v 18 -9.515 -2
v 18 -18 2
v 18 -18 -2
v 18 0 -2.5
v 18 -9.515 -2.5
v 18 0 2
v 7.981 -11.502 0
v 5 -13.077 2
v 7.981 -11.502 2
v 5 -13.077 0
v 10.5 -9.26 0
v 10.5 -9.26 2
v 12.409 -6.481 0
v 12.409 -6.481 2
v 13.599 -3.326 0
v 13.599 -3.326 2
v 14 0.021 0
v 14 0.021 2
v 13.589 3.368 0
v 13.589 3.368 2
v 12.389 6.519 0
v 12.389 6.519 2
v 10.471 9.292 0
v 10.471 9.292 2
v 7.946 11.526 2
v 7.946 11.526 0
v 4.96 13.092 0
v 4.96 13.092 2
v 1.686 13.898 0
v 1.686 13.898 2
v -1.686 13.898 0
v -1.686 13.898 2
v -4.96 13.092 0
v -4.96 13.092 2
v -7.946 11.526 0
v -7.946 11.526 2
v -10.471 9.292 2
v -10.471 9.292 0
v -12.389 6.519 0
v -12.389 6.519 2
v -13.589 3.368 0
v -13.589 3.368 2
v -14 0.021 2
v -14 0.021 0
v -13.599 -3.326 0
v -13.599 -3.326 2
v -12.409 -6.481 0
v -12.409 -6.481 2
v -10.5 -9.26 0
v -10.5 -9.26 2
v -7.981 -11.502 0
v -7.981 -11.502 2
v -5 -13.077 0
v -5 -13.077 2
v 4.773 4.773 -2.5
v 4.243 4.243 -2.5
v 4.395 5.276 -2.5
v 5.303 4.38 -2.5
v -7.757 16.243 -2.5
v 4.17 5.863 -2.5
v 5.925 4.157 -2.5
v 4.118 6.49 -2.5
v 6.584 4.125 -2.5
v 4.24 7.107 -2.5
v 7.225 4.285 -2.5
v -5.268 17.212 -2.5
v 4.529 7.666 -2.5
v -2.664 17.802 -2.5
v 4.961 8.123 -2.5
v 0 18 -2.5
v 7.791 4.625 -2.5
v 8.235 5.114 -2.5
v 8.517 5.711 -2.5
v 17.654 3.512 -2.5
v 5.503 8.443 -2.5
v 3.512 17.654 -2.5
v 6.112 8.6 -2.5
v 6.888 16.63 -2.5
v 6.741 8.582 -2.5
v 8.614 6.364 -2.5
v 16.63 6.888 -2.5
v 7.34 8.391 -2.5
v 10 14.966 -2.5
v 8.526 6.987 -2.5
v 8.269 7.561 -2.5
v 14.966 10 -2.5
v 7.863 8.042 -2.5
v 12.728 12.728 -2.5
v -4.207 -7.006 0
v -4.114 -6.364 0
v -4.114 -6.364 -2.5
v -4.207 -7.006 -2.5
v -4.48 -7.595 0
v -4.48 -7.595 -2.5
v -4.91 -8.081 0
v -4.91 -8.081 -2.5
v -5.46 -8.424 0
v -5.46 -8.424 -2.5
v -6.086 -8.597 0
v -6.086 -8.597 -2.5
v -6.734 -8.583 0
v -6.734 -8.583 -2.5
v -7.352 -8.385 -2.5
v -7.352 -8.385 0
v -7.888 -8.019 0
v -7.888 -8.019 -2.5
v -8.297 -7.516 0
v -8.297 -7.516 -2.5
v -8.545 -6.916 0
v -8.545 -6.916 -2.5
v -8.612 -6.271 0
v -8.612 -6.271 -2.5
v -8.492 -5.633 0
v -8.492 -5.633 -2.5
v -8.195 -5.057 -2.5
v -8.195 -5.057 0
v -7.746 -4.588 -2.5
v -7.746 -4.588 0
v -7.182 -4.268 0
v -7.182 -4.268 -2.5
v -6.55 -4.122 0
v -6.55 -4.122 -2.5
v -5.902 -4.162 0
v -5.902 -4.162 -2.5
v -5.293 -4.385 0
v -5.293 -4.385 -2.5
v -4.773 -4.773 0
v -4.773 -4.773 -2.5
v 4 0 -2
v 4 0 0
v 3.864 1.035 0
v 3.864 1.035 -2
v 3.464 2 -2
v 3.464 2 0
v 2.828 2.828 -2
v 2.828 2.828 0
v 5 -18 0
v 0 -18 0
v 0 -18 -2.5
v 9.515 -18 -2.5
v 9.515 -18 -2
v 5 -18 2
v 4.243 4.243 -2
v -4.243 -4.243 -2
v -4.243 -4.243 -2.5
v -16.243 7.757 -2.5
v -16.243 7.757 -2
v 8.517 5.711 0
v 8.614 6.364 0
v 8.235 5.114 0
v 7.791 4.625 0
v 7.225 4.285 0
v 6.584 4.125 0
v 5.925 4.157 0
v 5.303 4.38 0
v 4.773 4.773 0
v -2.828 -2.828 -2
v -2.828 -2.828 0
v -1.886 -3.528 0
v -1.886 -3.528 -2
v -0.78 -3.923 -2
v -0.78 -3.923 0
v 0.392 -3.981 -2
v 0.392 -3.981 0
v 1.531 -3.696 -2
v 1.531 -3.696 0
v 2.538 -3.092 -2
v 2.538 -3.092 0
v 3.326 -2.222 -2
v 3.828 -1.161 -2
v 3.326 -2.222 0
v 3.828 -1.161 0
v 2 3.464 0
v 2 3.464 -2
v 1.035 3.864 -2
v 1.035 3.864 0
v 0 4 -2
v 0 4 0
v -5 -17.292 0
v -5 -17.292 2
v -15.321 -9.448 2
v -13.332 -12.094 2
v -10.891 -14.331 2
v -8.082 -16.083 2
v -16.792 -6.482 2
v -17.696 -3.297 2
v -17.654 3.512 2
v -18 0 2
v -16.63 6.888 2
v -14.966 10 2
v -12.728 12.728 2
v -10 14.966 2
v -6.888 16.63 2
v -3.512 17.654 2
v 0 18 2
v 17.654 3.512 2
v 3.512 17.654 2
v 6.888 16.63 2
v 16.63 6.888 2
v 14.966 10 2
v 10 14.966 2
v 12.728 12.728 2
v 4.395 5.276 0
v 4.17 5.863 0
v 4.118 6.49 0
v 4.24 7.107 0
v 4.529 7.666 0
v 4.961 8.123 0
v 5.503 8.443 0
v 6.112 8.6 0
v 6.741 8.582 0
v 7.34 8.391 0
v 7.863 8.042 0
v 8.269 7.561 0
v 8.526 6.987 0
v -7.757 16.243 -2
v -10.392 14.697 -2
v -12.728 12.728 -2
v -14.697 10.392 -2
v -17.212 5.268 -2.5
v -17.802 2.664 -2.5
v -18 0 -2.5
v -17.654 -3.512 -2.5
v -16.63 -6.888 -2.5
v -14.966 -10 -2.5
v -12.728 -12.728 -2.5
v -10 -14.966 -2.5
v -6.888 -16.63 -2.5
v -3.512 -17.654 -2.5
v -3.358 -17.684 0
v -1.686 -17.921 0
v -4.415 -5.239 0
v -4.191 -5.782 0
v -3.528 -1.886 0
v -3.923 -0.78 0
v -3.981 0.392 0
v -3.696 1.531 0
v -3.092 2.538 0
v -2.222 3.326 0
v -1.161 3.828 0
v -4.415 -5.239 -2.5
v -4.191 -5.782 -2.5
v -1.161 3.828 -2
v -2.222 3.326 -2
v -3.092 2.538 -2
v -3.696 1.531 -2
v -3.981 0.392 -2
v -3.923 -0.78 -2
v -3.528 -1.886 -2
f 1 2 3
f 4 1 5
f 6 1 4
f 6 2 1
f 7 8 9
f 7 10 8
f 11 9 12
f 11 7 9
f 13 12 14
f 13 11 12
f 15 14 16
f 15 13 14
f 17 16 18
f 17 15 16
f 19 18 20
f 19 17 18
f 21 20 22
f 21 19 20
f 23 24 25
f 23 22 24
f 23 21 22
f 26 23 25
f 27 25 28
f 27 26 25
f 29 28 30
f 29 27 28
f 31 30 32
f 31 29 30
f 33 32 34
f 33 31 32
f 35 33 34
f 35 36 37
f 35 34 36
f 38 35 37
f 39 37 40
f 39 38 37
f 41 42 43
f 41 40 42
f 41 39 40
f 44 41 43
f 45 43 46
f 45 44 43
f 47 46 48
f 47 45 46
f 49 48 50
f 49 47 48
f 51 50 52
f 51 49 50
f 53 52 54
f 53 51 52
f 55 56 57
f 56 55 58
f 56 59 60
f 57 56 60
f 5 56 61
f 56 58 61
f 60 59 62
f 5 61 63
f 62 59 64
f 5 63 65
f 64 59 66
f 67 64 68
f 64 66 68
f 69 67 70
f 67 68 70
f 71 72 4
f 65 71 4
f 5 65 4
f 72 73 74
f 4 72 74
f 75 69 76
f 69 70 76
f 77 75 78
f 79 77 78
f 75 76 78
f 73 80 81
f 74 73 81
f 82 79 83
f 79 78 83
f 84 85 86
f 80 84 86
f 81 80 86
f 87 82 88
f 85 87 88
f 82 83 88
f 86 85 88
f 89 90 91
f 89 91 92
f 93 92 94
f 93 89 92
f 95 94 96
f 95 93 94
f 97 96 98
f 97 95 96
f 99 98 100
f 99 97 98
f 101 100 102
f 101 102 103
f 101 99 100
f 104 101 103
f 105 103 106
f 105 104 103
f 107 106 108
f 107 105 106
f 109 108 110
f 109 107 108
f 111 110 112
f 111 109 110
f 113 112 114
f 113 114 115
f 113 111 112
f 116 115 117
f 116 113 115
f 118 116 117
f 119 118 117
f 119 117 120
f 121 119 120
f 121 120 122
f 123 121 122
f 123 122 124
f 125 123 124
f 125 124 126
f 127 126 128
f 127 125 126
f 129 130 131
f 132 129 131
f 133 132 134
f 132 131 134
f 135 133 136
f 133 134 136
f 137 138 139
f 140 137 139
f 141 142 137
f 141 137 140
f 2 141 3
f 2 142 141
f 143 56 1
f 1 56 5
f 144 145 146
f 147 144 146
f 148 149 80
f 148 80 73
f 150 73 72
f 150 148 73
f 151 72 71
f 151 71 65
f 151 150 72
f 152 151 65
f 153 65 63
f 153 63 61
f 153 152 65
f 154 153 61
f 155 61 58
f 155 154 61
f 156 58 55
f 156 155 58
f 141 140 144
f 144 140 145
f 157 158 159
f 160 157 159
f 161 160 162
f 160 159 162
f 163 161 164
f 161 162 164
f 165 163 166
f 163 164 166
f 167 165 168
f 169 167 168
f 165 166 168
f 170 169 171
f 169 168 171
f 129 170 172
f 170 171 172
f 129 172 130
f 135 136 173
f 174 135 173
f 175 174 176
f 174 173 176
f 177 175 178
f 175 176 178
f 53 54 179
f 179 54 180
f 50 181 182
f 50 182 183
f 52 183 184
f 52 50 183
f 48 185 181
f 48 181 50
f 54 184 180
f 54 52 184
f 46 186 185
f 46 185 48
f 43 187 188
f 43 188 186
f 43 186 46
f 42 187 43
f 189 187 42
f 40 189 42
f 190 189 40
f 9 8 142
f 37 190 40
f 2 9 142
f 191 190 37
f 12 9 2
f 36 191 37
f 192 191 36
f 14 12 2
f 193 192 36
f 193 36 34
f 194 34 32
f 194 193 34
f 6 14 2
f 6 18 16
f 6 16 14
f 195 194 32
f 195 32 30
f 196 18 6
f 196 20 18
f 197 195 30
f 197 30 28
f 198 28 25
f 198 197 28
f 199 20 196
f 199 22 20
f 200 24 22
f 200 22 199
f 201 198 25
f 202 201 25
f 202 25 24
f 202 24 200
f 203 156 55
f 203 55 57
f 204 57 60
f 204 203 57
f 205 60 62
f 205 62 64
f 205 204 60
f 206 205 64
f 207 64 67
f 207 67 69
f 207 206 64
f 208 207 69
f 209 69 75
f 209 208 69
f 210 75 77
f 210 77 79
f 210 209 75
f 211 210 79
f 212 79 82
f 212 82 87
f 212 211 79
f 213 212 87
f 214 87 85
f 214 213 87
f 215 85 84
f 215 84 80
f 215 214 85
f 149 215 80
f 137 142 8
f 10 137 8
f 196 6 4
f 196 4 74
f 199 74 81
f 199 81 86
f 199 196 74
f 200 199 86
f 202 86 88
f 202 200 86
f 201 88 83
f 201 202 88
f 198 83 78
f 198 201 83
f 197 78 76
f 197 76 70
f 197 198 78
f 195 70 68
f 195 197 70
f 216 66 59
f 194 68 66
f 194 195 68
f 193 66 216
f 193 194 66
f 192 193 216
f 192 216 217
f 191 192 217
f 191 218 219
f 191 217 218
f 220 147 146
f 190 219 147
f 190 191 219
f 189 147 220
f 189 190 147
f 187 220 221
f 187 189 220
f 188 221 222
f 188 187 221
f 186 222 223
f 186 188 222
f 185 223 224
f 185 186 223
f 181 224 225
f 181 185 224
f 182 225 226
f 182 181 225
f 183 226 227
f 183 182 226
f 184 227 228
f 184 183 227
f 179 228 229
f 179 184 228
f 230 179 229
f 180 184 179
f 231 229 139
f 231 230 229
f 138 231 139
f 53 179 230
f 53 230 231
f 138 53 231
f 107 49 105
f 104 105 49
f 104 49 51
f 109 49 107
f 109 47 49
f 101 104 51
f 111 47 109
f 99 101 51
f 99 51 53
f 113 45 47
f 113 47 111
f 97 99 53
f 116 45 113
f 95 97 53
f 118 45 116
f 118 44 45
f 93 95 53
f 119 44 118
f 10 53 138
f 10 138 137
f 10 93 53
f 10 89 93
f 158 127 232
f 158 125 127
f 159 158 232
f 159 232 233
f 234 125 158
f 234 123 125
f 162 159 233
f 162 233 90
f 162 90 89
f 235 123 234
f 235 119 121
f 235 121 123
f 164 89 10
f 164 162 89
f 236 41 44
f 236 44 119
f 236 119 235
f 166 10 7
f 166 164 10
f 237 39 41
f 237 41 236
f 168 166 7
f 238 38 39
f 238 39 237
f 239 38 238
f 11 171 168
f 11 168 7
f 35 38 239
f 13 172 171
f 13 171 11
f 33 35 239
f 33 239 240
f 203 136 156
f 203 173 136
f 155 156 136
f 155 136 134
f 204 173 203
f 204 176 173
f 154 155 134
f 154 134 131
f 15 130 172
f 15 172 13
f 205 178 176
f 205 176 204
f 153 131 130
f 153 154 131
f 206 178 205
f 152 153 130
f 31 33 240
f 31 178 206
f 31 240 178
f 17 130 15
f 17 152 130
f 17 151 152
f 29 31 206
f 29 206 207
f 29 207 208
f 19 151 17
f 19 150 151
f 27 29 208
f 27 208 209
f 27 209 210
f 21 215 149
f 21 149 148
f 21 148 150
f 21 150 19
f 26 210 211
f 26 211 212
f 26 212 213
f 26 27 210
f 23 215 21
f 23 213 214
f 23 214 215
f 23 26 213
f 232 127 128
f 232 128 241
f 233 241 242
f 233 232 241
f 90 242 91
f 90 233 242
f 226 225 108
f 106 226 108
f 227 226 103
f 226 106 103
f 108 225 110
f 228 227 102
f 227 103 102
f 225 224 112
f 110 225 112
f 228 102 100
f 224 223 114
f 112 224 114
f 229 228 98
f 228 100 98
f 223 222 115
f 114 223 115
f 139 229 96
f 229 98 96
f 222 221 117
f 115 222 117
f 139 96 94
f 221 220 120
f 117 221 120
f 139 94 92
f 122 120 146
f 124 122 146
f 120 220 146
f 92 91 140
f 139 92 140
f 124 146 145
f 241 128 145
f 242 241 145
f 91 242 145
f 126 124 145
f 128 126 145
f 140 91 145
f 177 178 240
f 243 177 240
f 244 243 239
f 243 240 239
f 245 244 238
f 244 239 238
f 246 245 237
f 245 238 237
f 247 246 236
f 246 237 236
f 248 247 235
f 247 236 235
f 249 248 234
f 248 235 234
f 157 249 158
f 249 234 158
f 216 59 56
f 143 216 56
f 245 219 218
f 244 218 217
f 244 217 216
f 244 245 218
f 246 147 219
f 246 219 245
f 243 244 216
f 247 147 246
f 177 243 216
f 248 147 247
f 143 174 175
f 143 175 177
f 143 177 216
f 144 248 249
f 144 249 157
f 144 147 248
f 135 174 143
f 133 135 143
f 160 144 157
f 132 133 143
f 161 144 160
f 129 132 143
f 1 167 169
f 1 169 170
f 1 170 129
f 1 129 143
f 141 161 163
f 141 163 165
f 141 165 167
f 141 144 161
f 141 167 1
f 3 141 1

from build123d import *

# Parameters (mm, degrees)
F0_R     = 14
F1_DEPTH = 2
F2_DEPTH = 2.5
F3_DEPTH = 3
F5_DEPTH = 0.5
F7_DEPTH = 2


# Not quite as in the source:
# - a feature names something its author has since deleted; it is built from what else it names


with BuildPart() as f1:
    # F0 (on Top) → F1 (new body)
    with BuildSketch(Plane.XY):
        with BuildLine():
            Line((18, -18), (18, 0))
            ThreePointArc((18, 0), (12.7279220614, 12.7279220614), (0, 18))
            ThreePointArc((0, 18), (-12.7279220614, 12.7279220614), (-18, 0))
            ThreePointArc((-18, 0), (-12.7279220614, -12.7279220614), (0, -18))
            Line((0, -18), (18, -18))
        make_face()
        Circle(F0_R, mode=Mode.SUBTRACT)
    extrude(amount=F1_DEPTH)

    # F0 (on Top) → F2 (join)
    with BuildSketch(Plane.XY):
        with BuildLine():
            Line((18, -18), (18, 0))
            ThreePointArc((18, 0), (12.7279220614, 12.7279220614), (0, 18))
            ThreePointArc((0, 18), (-12.7279220614, 12.7279220614), (-18, 0))
            ThreePointArc((-18, 0), (-12.7279220614, -12.7279220614), (0, -18))
            Line((0, -18), (18, -18))
        make_face()
        Circle(F0_R, mode=Mode.SUBTRACT)
        Circle(F0_R)
        with BuildLine():
            ThreePointArc((-4.1139610307, -6.3639610307), (-8.4426899788, -7.2249987535), (-4.772970773, -4.772970773))
            ThreePointArc((-4.772970773, -4.772970773), (-4.2852320825, -5.5029233079), (-4.1139610307, -6.3639610307))
        make_face(mode=Mode.SUBTRACT)
        with BuildLine():
            ThreePointArc((2.8284271247, 2.8284271247), (3.69551813, 1.5307337295), (4, 0))
            ThreePointArc((4, 0), (1.5307337295, -3.69551813), (-2.8284271247, -2.8284271247))
            ThreePointArc((-2.8284271247, -2.8284271247), (-3.69551813, 1.5307337295), (0, 4))
            ThreePointArc((0, 4), (1.5307337295, 3.69551813), (2.8284271247, 2.8284271247))
        make_face(mode=Mode.SUBTRACT)
        with BuildLine():
            ThreePointArc((8.6139610307, 6.3639610307), (7.2249987535, 4.2852320825), (4.772970773, 4.772970773))
            ThreePointArc((4.772970773, 4.772970773), (5.5029233079, 8.4426899788), (8.6139610307, 6.3639610307))
        make_face(mode=Mode.SUBTRACT)
        with BuildLine():
            ThreePointArc((-2.8284271247, -2.8284271247), (1.5307337295, -3.69551813), (4, 0))
            Line((4, 0), (0, 0))
            Line((0, 0), (-2.8284271247, -2.8284271247))
        make_face()
        with BuildLine():
            Line((0, 0), (2.8284271247, 2.8284271247))
            ThreePointArc((2.8284271247, 2.8284271247), (1.5307337295, 3.69551813), (0, 4))
            Line((0, 4), (0, 0))
        make_face()
        with BuildLine():
            ThreePointArc((0, 4), (-3.69551813, 1.5307337295), (-2.8284271247, -2.8284271247))
            Line((-2.8284271247, -2.8284271247), (0, 0))
            Line((0, 0), (0, 4))
        make_face()
        with BuildLine():
            Line((0, 0), (4, 0))
            ThreePointArc((4, 0), (3.69551813, 1.5307337295), (2.8284271247, 2.8284271247))
            Line((2.8284271247, 2.8284271247), (0, 0))
        make_face()
    extrude(amount=-F2_DEPTH)

    # F0 (on Top) → F3 (cut)
    with BuildSketch(Plane.XY):
        with BuildLine():
            ThreePointArc((-2.8284271247, -2.8284271247), (1.5307337295, -3.69551813), (4, 0))
            Line((4, 0), (0, 0))
            Line((0, 0), (-2.8284271247, -2.8284271247))
        make_face()
        with BuildLine():
            Line((0, 0), (4, 0))
            ThreePointArc((4, 0), (3.69551813, 1.5307337295), (2.8284271247, 2.8284271247))
            Line((2.8284271247, 2.8284271247), (0, 0))
        make_face()
        with BuildLine():
            Line((0, 0), (2.8284271247, 2.8284271247))
            ThreePointArc((2.8284271247, 2.8284271247), (1.5307337295, 3.69551813), (0, 4))
            Line((0, 4), (0, 0))
        make_face()
        with BuildLine():
            ThreePointArc((0, 4), (-3.69551813, 1.5307337295), (-2.8284271247, -2.8284271247))
            Line((-2.8284271247, -2.8284271247), (0, 0))
            Line((0, 0), (0, 4))
        make_face()
    extrude(amount=-F3_DEPTH, mode=Mode.SUBTRACT)

    # F4 (on face) → F5 (cut)
    with BuildSketch(Plane(origin=(0, 0, -2.5), x_dir=(1, 0, 0), z_dir=(0, 0, -1))):
        Polygon((4.2426406871, -4.2426406871), (0, 0), (-4.2426406871, 4.2426406871), (-16.9705627485, -8.4852813742), (-8.4852813742, -16.9705627485), align=None)
        Polygon((8.4852813742, 0), (0, 0), (4.2426406871, -4.2426406871), align=None)
        with BuildLine():
            Line((-2.8284271247, 2.8284271247), (0, 0))
            Line((0, 0), (4, 0))
            ThreePointArc((4, 0), (1.5307337295, 3.69551813), (-2.8284271247, 2.8284271247))
        make_face()
        with BuildLine():
            Line((-4.2426406871, 4.2426406871), (-2.8284271247, 2.8284271247))
            ThreePointArc((-2.8284271247, 2.8284271247), (1.5307337295, 3.69551813), (4, 0))
            Line((4, 0), (8.4852813742, 0))
            Line((8.4852813742, 0), (18, 9.5147186258))
            Line((18, 9.5147186258), (18, 18))
            Line((18, 18), (9.5147186258, 18))
            Line((9.5147186258, 18), (-4.2426406871, 4.2426406871))
        make_face()
    extrude(amount=-F5_DEPTH, mode=Mode.SUBTRACT)

    # F6 (on face) → F7 (cut)
    with BuildSketch(Plane.XY.offset(2)):
        with BuildLine():
            Line((5, -9), (0, -9))
            Line((0, -9), (0, -14))
            ThreePointArc((0, -14), (2.542267135, -13.7672392953), (5, -13.0766968306))
            Line((5, -13.0766968306), (5, -9))
        make_face()
        with BuildLine():
            Line((0, -14), (0, -9))
            Line((0, -9), (-5, -9))
            Line((-5, -9), (-5, -13.0766968306))
            ThreePointArc((-5, -13.0766968306), (-2.542267135, -13.7672392953), (0, -14))
        make_face()
        with BuildLine():
            Line((5, -18), (0, -18))
            ThreePointArc((0, -18), (-2.5249657043, -17.8220242451), (-5, -17.2916164658))
            Line((-5, -17.2916164658), (-5, -19))
            Line((-5, -19), (5, -19))
            Line((5, -19), (5, -18))
        make_face()
        with BuildLine():
            ThreePointArc((5, -13.0766968306), (2.542267135, -13.7672392953), (0, -14))
            Line((0, -14), (0, -18))
            Line((0, -18), (5, -18))
            Line((5, -18), (5, -13.0766968306))
        make_face()
        with BuildLine():
            Line((0, -18), (0, -14))
            ThreePointArc((0, -14), (-2.542267135, -13.7672392953), (-5, -13.0766968306))
            Line((-5, -13.0766968306), (-5, -17.2916164658))
            ThreePointArc((-5, -17.2916164658), (-2.5249657043, -17.8220242451), (0, -18))
        make_face()
    extrude(amount=-F7_DEPTH, mode=Mode.SUBTRACT)


solid = f1.part
